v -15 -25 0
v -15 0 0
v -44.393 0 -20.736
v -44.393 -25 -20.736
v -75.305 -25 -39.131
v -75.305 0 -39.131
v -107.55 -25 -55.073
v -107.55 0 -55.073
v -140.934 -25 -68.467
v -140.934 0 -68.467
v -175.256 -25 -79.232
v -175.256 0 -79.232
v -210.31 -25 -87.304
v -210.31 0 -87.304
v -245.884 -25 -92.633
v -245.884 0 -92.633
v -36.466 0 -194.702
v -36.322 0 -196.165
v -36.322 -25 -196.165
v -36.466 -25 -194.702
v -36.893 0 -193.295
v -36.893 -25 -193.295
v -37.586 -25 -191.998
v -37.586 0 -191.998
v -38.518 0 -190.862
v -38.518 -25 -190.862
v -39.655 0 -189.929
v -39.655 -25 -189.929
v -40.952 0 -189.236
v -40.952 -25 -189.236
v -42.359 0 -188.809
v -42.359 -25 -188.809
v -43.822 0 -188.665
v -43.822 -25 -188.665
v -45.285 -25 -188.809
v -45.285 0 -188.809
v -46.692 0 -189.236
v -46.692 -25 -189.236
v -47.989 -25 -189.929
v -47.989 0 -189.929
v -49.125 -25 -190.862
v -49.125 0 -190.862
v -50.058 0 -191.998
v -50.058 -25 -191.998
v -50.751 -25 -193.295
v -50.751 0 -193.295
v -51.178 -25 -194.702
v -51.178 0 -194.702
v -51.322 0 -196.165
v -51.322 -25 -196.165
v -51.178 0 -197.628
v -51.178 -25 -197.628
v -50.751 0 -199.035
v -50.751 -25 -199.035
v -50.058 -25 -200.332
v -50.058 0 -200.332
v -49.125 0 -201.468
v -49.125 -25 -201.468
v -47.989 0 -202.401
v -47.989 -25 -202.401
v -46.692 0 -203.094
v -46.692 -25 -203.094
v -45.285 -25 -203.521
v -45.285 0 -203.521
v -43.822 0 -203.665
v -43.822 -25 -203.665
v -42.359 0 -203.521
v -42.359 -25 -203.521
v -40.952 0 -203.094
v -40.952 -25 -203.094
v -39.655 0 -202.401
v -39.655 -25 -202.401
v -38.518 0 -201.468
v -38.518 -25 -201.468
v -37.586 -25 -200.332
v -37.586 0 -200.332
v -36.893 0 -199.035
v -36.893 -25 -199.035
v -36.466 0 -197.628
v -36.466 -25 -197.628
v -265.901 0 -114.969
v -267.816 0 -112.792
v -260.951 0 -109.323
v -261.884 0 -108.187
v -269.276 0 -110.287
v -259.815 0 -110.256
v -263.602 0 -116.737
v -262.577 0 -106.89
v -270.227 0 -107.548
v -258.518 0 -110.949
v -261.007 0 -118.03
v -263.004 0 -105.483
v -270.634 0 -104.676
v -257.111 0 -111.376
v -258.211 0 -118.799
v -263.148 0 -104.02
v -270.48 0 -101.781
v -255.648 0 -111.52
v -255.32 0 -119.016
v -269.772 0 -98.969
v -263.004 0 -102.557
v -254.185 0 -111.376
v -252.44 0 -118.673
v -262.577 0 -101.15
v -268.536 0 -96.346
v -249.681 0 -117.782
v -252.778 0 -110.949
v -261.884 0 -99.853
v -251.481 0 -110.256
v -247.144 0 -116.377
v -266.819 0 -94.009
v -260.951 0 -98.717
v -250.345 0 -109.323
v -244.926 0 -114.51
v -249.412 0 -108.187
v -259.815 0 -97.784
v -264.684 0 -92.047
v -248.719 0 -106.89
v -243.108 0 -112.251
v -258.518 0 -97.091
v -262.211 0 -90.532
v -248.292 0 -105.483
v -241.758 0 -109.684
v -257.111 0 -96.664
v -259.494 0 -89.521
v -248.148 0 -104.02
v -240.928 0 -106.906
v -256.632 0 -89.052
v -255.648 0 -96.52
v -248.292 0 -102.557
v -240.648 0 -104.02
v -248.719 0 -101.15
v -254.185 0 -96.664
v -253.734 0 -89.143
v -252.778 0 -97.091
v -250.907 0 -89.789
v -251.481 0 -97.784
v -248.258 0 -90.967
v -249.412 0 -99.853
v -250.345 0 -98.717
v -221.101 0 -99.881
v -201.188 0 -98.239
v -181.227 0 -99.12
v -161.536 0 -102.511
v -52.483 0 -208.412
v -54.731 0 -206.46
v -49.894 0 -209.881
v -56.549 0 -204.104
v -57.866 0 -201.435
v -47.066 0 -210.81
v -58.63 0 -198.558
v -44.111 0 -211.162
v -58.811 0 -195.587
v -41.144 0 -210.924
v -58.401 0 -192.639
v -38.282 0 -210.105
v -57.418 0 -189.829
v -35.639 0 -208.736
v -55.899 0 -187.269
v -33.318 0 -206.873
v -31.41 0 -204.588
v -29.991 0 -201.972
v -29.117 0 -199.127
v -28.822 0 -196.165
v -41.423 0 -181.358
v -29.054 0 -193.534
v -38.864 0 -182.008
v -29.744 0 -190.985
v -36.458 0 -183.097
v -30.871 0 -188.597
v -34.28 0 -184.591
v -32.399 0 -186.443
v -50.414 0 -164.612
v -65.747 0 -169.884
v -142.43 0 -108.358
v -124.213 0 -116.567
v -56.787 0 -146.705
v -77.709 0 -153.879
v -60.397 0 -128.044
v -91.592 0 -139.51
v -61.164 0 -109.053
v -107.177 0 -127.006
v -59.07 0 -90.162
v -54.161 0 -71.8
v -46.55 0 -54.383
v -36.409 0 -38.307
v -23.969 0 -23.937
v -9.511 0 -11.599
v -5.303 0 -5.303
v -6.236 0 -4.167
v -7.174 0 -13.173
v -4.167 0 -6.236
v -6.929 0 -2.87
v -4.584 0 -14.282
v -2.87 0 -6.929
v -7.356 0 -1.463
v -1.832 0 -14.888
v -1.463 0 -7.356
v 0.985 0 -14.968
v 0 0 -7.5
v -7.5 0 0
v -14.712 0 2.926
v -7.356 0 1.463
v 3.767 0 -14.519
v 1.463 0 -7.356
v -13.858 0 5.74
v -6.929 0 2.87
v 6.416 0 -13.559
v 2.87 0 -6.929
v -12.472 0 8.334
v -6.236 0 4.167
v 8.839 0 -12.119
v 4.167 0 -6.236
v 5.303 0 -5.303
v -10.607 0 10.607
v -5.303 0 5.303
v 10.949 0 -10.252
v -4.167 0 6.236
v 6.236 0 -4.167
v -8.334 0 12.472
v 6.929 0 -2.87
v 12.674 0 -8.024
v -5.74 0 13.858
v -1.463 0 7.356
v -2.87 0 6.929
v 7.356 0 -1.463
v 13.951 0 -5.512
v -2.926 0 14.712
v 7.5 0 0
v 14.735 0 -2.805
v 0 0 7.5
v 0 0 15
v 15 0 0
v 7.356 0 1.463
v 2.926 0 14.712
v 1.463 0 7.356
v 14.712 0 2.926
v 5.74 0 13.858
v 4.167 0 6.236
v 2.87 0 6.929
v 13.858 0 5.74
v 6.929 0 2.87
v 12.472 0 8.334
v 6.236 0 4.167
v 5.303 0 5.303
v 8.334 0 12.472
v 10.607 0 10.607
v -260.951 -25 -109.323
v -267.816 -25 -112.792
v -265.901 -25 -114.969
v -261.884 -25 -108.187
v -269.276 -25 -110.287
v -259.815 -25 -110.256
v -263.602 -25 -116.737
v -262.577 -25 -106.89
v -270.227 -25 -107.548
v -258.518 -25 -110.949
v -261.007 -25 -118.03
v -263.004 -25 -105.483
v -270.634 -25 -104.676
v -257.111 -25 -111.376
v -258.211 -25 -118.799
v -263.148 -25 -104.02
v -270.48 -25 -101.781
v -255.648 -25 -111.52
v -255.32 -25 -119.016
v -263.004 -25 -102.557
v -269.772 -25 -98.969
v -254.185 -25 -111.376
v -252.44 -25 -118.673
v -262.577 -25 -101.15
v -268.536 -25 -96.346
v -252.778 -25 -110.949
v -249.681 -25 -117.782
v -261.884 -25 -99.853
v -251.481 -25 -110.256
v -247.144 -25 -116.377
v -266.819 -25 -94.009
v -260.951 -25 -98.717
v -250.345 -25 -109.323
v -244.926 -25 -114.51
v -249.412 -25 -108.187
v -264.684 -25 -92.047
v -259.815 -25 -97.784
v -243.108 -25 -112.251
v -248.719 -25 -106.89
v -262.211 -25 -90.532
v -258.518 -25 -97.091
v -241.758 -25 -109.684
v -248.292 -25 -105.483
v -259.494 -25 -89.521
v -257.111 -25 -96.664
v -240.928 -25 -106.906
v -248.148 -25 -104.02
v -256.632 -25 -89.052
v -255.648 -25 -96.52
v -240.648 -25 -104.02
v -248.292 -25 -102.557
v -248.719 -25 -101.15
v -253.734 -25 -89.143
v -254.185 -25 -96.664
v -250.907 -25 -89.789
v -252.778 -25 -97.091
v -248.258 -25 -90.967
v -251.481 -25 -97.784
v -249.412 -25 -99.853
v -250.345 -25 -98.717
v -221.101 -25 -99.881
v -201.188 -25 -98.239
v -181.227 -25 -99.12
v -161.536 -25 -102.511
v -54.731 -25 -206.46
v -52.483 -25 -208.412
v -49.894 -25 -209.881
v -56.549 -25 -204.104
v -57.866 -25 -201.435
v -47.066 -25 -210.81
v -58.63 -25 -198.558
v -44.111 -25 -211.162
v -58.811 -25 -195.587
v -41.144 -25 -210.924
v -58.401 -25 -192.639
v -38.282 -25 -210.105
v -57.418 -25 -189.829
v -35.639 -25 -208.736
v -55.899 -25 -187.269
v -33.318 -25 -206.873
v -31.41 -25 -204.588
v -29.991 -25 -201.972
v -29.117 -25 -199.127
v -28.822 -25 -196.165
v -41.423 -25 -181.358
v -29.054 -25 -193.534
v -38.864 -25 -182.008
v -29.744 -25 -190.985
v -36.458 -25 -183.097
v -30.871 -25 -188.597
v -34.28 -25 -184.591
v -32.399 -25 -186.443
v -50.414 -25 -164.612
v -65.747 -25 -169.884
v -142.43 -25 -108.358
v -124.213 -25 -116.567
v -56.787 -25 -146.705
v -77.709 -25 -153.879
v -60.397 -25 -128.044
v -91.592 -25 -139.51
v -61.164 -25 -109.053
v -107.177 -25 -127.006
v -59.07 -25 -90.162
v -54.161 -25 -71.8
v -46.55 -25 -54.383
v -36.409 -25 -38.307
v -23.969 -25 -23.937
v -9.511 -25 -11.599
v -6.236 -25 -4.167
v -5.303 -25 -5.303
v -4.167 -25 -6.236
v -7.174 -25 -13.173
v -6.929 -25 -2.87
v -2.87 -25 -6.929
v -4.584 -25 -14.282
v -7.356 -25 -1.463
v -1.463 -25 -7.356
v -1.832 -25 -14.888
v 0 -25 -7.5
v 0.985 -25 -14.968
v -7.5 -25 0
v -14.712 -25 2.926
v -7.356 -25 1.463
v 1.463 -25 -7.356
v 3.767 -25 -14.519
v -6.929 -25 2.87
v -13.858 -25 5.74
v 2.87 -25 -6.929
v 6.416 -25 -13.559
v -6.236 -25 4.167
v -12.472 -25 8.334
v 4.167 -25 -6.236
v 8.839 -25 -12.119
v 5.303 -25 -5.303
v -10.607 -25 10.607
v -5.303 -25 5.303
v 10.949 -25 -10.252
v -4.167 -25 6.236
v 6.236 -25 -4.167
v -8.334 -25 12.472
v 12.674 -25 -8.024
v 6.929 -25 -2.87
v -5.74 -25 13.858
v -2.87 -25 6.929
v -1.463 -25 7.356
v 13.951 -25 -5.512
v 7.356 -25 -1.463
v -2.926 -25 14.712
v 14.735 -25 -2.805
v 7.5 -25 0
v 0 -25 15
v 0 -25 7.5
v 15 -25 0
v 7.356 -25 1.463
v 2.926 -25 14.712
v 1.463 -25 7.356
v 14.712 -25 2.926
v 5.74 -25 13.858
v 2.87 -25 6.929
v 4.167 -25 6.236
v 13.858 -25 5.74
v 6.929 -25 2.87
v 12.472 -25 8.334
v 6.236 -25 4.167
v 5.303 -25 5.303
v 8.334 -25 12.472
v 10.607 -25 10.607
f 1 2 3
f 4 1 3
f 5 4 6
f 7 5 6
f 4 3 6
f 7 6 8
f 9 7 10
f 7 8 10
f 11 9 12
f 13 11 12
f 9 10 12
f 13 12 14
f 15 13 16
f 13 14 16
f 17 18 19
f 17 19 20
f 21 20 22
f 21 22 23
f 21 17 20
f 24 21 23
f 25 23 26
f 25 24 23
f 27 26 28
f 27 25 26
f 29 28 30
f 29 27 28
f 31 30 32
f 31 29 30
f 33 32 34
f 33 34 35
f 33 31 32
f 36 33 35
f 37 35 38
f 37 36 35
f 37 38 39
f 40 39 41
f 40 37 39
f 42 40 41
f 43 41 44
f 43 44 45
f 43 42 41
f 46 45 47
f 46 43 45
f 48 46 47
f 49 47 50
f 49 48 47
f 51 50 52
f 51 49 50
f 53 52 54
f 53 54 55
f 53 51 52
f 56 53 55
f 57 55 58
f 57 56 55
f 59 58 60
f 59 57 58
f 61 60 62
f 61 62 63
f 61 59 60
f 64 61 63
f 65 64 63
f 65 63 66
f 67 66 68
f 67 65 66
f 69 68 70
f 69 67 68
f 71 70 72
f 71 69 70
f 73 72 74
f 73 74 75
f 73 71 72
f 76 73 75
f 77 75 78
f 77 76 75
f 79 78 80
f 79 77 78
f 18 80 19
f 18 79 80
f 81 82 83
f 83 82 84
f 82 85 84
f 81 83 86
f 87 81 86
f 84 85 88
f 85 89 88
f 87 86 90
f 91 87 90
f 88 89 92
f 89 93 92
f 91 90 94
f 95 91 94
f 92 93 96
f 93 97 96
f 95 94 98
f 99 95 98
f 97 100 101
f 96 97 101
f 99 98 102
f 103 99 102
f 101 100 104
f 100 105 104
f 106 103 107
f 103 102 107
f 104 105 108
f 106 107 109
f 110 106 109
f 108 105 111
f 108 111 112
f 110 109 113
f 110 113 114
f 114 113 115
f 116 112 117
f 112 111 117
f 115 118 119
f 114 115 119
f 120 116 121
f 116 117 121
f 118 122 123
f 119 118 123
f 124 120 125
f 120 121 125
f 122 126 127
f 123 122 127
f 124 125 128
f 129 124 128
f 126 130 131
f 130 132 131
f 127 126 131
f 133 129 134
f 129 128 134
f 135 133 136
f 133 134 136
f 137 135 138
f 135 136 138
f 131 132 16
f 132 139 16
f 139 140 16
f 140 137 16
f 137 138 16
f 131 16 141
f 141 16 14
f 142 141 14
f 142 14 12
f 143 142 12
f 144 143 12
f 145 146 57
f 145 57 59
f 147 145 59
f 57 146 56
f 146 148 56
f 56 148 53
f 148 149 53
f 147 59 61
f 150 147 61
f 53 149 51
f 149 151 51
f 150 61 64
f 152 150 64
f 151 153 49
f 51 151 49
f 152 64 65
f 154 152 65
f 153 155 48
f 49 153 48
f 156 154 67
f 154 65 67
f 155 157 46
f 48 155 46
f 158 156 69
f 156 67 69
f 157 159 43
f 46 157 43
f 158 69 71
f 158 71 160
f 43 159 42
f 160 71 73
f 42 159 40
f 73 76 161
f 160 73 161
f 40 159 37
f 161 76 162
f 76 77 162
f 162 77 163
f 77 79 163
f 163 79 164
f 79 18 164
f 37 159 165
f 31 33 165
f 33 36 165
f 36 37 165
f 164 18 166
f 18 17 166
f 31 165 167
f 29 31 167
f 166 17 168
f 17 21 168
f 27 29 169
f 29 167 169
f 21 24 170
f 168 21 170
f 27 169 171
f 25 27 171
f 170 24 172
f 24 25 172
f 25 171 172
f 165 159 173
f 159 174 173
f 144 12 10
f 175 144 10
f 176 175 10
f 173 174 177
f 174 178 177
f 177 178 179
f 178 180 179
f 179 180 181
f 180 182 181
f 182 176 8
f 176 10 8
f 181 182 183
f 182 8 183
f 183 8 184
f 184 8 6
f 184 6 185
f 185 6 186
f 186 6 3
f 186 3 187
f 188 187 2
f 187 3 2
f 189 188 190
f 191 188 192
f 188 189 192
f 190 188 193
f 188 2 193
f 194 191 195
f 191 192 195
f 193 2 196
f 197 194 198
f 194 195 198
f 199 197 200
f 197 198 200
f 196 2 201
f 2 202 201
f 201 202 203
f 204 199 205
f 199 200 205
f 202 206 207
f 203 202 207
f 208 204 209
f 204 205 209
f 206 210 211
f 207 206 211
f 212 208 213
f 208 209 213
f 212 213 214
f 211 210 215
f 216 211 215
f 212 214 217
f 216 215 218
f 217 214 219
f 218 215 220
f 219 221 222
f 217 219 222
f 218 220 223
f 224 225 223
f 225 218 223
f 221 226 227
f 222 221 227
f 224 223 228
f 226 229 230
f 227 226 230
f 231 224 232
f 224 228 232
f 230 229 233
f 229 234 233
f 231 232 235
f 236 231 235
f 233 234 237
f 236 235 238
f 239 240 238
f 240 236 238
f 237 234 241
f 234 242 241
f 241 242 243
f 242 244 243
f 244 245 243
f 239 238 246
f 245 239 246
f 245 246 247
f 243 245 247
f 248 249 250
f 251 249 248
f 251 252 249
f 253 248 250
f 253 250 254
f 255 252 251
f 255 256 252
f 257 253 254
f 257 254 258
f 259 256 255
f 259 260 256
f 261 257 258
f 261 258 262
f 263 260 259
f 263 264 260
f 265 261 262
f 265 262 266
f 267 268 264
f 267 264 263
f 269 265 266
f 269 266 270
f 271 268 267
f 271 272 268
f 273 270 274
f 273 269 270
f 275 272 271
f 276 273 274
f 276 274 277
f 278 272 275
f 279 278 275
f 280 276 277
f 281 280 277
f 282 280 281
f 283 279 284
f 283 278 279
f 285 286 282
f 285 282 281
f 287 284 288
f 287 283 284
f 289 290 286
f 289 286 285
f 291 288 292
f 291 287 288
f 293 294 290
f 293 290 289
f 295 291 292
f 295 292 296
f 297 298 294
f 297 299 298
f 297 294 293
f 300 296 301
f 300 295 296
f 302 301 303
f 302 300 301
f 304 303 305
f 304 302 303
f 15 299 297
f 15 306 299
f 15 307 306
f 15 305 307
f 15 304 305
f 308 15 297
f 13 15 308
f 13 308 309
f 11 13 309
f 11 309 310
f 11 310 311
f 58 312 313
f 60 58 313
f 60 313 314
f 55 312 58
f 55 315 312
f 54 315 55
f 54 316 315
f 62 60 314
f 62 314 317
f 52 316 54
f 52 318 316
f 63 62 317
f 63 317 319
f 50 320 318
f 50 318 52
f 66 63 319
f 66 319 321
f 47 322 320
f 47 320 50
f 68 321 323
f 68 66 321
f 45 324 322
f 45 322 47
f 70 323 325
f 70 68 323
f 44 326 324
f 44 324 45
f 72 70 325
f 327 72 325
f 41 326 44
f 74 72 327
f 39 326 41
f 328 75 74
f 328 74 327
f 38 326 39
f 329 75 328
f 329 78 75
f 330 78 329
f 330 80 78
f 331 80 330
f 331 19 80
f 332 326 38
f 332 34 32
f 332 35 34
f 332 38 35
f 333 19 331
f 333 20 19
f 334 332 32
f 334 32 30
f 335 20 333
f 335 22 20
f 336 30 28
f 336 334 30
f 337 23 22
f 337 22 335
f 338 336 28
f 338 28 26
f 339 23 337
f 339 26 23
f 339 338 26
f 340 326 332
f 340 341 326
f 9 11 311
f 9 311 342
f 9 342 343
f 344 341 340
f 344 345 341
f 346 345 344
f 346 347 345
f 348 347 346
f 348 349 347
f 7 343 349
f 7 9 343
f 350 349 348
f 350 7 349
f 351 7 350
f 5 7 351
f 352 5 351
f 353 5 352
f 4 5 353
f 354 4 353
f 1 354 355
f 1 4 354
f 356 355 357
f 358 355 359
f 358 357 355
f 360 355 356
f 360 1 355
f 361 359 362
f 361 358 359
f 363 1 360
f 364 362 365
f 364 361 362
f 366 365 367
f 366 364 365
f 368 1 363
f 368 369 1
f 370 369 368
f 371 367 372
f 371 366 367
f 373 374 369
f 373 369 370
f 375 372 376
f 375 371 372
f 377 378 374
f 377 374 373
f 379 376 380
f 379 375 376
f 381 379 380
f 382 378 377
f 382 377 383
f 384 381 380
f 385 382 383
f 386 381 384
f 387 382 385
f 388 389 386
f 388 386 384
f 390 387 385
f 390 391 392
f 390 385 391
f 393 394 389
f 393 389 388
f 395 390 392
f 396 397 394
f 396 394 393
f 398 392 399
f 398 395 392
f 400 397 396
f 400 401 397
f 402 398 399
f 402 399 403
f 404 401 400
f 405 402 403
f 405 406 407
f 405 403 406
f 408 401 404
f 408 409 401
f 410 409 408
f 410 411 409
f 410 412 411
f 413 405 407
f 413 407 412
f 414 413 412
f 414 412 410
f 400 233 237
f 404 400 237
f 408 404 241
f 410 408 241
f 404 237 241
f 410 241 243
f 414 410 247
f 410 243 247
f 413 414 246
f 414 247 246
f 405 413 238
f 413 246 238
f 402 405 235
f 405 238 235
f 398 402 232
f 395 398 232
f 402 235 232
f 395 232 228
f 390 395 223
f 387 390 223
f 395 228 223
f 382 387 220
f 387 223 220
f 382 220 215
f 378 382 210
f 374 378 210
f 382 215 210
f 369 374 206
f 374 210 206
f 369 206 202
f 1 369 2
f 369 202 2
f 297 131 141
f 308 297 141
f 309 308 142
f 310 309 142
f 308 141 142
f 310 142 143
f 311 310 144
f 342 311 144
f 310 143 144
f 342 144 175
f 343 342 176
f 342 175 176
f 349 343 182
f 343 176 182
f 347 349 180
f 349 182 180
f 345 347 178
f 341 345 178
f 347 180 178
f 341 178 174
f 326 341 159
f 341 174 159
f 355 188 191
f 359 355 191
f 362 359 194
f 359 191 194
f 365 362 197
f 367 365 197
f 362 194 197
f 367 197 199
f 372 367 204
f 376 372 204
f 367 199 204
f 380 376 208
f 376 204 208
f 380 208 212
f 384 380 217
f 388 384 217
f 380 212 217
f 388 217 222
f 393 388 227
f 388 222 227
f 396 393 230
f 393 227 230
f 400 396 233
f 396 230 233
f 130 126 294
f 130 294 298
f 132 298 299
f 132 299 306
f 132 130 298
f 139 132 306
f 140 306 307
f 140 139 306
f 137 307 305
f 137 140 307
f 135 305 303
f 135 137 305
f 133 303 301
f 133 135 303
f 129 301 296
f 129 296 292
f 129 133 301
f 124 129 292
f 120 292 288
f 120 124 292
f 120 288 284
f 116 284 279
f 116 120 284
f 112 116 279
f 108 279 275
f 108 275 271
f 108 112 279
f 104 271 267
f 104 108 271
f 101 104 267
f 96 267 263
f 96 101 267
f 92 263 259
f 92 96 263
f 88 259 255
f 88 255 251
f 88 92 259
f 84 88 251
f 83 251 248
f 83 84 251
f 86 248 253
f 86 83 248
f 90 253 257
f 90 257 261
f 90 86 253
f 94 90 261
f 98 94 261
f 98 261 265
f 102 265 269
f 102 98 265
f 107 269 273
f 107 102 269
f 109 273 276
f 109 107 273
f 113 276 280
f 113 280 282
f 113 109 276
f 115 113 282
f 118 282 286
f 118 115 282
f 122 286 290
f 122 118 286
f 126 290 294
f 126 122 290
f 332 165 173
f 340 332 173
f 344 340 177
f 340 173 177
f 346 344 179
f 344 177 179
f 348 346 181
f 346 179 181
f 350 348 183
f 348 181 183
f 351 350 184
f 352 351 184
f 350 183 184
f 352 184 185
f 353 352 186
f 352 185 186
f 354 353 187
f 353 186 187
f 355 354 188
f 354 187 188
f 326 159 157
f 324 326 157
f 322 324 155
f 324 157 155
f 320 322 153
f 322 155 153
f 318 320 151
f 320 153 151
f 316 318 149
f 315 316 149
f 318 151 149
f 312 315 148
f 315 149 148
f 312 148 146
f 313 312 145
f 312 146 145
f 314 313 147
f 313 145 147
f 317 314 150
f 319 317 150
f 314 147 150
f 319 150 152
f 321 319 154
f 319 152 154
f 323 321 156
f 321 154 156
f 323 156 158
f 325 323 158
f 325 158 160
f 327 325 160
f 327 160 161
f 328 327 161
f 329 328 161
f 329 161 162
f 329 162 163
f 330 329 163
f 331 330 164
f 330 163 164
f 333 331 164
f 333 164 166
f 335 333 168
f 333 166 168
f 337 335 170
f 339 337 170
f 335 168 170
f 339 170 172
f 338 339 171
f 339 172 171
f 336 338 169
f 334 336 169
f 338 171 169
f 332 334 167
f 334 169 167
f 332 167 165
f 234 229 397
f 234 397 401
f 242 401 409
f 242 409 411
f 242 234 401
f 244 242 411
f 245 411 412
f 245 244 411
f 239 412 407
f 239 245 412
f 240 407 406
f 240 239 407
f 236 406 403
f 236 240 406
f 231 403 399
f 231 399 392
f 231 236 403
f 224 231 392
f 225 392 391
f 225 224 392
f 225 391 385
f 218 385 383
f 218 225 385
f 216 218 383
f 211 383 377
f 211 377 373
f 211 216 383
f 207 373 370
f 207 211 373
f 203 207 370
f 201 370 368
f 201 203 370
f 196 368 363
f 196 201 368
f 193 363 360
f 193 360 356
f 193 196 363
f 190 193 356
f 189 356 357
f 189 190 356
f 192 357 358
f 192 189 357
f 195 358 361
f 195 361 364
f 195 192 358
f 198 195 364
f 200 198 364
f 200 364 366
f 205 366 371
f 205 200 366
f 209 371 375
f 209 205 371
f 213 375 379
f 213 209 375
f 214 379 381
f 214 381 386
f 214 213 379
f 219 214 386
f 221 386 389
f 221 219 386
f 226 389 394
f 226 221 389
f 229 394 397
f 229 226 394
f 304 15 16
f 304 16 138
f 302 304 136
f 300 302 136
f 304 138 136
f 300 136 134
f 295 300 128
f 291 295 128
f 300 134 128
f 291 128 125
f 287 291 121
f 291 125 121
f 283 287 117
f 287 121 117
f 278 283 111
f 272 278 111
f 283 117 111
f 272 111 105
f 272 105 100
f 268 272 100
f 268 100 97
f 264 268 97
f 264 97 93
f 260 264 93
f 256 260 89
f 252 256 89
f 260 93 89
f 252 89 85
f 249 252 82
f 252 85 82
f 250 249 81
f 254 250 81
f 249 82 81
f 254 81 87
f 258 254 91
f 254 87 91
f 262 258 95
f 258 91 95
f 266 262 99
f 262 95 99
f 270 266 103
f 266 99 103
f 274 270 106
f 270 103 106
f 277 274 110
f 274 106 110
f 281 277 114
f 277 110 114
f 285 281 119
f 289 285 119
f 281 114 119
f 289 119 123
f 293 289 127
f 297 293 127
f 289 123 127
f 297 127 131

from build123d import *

# Parameters (mm, degrees)
F0_R     = 7.5
F1_DEPTH = 25


with BuildPart() as f1:
    # F0 (on Front) → F1 (new body)
    with BuildSketch(Plane.XZ):
        with BuildLine():
            ThreePointArc((-9.511187, -11.599023), (6.416081, -13.558536), (15, 0))
            ThreePointArc((15, 0), (0, 15), (-15, 0))
            ThreePointArc((-15, 0), (-13.558536, -6.416081), (-9.511187, -11.599023))
        make_face()
        Circle(F0_R, mode=Mode.SUBTRACT)
        with BuildLine():
            ThreePointArc((-9.511187, -11.599023), (-13.558536, -6.416081), (-15, 0))
            ThreePointArc((-15, 0), (-124.111916, -62.094191), (-245.884248, -92.632656))
            ThreePointArc((-245.884248, -92.632656), (-242.019707, -97.753195), (-240.647886, -104.019989))
            ThreePointArc((-240.647886, -104.019989), (-133.191596, -112.174328), (-55.899361, -187.26932))
            ThreePointArc((-55.899361, -187.26932), (-49.492549, -182.278121), (-41.423323, -181.357856))
            ThreePointArc((-41.423323, -181.357856), (-59.069676, -90.161684), (-9.511187, -11.599023))
        make_face()
        with BuildLine():
            ThreePointArc((-240.647886, -104.019989), (-242.019707, -97.753195), (-245.884248, -92.632656))
            ThreePointArc((-245.884248, -92.632656), (-269.276066, -110.286784), (-240.647886, -104.019989))
        make_face()
        with Locations((-255.647886, -104.019989)):
            Circle(F0_R, mode=Mode.SUBTRACT)
        with BuildLine():
            ThreePointArc((-28.821729, -196.16487), (-32.398592, -186.443144), (-41.423323, -181.357856))
            ThreePointArc((-41.423323, -181.357856), (-49.492549, -182.278121), (-55.899361, -187.26932))
            ThreePointArc((-55.899361, -187.26932), (-48.50337, -210.415562), (-28.821729, -196.16487))
        make_face()
        with Locations((-43.821729, -196.16487)):
            Circle(F0_R, mode=Mode.SUBTRACT)
    extrude(amount=F1_DEPTH)


solid = f1.part
